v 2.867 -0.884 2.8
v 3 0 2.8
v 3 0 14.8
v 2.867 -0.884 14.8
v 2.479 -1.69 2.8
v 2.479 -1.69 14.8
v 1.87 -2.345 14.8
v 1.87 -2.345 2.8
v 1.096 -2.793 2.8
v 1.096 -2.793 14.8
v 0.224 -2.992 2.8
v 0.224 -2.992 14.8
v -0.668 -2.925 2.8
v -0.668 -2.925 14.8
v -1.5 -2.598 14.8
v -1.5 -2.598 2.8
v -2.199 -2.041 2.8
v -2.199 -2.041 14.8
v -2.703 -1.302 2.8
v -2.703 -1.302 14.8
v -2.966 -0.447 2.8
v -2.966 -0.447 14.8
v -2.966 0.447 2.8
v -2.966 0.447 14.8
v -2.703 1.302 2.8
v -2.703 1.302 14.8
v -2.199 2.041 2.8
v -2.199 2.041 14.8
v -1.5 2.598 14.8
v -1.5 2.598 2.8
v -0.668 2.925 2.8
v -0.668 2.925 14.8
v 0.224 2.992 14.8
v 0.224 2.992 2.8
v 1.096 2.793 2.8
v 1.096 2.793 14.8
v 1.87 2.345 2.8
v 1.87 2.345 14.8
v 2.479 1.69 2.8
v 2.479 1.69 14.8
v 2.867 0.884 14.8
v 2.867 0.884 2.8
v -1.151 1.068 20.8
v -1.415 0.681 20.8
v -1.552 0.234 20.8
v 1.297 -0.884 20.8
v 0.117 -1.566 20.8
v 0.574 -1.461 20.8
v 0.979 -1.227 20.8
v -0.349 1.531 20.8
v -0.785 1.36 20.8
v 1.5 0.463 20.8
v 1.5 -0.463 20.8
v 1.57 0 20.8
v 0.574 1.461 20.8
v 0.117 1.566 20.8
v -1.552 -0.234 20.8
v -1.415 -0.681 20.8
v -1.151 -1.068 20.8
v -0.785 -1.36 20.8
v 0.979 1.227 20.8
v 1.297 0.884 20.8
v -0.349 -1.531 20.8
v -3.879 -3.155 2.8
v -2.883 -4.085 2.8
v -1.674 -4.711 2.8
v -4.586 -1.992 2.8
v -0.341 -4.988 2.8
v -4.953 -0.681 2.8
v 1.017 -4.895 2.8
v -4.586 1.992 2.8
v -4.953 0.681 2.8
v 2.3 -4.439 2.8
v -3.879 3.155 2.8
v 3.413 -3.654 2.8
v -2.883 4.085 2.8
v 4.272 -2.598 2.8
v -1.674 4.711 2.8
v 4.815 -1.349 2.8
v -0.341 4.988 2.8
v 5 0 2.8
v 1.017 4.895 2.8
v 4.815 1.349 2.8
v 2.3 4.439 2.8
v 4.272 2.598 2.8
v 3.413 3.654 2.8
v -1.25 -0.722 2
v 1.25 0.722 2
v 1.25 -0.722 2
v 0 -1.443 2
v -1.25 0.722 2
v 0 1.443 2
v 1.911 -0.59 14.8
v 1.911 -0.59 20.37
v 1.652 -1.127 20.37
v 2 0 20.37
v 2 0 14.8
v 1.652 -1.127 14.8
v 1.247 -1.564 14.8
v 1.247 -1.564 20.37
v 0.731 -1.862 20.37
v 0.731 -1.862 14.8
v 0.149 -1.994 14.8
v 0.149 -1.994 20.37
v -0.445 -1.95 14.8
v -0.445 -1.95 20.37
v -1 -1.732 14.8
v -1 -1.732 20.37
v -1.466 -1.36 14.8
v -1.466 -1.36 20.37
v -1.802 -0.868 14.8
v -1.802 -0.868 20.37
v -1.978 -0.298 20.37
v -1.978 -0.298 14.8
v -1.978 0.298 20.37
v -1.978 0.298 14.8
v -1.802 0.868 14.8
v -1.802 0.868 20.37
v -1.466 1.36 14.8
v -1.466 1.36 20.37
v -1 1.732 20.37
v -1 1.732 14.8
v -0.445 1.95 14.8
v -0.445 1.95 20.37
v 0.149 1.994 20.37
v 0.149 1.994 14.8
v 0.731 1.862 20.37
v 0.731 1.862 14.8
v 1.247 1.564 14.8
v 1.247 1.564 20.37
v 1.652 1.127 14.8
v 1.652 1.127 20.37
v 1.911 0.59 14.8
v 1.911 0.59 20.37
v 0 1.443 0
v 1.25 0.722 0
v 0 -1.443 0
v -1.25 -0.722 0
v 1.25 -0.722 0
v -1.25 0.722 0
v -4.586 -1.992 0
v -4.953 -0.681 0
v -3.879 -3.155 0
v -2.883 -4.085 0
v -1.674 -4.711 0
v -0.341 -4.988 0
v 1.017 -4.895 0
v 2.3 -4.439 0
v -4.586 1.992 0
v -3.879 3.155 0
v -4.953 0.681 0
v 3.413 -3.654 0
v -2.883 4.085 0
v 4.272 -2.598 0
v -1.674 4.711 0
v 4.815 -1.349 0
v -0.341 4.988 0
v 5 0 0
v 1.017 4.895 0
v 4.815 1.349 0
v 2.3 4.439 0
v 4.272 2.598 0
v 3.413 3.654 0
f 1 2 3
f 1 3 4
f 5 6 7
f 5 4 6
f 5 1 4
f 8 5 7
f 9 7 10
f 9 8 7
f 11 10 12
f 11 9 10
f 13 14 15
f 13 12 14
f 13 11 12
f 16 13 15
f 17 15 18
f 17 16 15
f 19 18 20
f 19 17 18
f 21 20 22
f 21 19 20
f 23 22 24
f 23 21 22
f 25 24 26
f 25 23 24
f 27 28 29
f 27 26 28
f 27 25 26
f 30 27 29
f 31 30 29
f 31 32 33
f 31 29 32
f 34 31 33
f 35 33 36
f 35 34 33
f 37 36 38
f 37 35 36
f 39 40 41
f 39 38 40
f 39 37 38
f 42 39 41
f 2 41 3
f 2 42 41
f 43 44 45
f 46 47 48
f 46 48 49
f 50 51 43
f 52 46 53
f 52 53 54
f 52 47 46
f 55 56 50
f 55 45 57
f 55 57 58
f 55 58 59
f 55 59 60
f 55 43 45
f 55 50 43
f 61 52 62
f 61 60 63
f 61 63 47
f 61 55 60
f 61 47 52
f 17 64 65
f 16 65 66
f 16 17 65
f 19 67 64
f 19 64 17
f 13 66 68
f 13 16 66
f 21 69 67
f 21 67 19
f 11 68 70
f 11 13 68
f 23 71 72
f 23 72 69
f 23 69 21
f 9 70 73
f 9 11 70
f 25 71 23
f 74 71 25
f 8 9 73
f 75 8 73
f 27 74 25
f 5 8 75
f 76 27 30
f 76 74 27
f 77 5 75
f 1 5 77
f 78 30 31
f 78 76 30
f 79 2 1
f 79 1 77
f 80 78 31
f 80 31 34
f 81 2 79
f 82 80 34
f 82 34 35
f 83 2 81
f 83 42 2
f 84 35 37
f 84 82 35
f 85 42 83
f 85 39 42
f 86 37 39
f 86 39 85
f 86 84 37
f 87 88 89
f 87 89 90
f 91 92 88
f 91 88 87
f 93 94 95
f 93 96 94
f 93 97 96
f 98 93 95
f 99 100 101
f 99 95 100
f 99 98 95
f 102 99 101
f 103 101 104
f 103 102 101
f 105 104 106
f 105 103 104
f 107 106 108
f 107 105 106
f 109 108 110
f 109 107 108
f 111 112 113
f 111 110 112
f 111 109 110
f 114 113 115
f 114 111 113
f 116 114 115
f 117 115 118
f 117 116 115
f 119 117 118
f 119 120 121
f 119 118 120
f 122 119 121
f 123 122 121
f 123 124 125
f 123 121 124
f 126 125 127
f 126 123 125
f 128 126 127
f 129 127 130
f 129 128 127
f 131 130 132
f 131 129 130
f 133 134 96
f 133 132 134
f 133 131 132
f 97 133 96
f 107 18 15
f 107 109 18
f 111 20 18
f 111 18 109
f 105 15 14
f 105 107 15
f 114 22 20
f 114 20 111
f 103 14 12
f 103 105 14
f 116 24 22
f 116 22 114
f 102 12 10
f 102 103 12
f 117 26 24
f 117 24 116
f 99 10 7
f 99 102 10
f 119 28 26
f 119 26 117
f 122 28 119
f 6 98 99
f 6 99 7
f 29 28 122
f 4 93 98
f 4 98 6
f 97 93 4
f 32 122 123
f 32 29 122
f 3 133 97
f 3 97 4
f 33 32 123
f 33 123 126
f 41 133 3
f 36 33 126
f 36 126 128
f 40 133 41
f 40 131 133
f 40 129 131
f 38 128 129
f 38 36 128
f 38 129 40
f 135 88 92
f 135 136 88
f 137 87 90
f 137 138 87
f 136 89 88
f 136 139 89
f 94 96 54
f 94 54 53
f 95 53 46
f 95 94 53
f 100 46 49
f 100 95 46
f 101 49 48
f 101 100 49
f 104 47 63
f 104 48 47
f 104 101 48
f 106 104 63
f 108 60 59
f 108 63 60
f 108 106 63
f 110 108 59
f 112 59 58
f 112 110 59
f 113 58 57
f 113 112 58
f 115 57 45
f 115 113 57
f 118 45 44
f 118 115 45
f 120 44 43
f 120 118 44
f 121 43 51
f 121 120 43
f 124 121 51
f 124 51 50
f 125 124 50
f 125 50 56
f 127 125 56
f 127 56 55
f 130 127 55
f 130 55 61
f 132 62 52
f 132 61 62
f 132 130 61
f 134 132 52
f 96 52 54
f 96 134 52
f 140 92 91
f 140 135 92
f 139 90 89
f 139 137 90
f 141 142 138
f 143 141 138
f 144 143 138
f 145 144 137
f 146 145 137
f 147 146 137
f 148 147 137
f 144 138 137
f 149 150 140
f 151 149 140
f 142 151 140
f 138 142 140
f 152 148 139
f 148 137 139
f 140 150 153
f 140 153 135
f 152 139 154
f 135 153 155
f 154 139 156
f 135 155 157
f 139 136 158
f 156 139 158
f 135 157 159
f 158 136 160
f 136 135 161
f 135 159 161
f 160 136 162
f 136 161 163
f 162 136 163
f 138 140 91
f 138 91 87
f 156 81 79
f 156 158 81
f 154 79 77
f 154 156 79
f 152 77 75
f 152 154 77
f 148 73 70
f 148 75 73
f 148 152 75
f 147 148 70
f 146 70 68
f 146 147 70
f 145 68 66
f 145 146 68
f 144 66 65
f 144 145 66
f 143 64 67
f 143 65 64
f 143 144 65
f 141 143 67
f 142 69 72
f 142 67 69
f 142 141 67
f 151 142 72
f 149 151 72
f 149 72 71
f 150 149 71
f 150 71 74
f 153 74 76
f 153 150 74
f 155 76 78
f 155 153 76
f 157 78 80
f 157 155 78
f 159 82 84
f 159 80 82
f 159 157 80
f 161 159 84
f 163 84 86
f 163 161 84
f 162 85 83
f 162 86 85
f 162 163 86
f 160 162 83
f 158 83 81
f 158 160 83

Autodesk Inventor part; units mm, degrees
ref_plane "YZ Plane" through (0, 0, 0) normal (1, 0, 0) x (0, 1, 0)
ref_plane "XZ Plane" through (0, 0, 0) normal (0, 1, 0) x (-1, 0, 0)
ref_plane "XY Plane" through (0, 0, 0) normal (0, 0, 1) x (1, 0, 0)
sketch "Sketch1" plane through (0, 0, 0) normal (0, 1, 0) x (-1, 0, 0)
  line L0 (0, 0) -> (0, 20.8)
  line L1 (0, 20.8) -> (-2, 20.8)
  line L2 (-2, 20.8) -> (-2, 14.8)
  line L3 (-2, 14.8) -> (-3, 14.8)
  line L4 (-3, 14.8) -> (-3, 2.8)
  line L5 (-3, 2.8) -> (-5, 2.8)
  line L6 (-5, 2.8) -> (-5, 0)
  line L7 (-5, 0) -> (0, 0)
  dimension "d0" = 10
  dimension "d1" = 6
  dimension "d2" = 4
  dimension "d3" = 6
  dimension "d4" = 12
  dimension "d5" = 2.8
revolve "Revolution1" add sketch "Sketch1" angle 360 about axis through (0, 0, 0) along (0, 0, 1)
thread "Thread1" size "M4x0.7" class "6g" standard "ANSI Metric M Profile" length 6 offset 1.2
sketch "Sketch2" plane through (0, 0, 0) normal (0, 0, -1) x (-1, 0, 0)
  line L0 (0, 1.4434) -> (1.25, 0.7217)
  line L1 (1.25, 0.7217) -> (1.25, -0.7217)
  line L2 (1.25, -0.7217) -> (0, -1.4434)
  line L3 (0, -1.4434) -> (-1.25, -0.7217)
  line L4 (-1.25, -0.7217) -> (-1.25, 0.7217)
  line L5 (-1.25, 0.7217) -> (0, 1.4434)
  point P0 (0, 0)
  point P1 (0, 0)
  dimension "d9" = 2.5
extrude "Extrusion1" cut sketch "Sketch2" against normal blind 2
chamfer "Chamfer1" distance 0.43 angle 45 1 edges at (-2, 0, 20.8)
properties part number "DBTSY4-12-6-DHC" material "Stainless Steel AISI 304"
